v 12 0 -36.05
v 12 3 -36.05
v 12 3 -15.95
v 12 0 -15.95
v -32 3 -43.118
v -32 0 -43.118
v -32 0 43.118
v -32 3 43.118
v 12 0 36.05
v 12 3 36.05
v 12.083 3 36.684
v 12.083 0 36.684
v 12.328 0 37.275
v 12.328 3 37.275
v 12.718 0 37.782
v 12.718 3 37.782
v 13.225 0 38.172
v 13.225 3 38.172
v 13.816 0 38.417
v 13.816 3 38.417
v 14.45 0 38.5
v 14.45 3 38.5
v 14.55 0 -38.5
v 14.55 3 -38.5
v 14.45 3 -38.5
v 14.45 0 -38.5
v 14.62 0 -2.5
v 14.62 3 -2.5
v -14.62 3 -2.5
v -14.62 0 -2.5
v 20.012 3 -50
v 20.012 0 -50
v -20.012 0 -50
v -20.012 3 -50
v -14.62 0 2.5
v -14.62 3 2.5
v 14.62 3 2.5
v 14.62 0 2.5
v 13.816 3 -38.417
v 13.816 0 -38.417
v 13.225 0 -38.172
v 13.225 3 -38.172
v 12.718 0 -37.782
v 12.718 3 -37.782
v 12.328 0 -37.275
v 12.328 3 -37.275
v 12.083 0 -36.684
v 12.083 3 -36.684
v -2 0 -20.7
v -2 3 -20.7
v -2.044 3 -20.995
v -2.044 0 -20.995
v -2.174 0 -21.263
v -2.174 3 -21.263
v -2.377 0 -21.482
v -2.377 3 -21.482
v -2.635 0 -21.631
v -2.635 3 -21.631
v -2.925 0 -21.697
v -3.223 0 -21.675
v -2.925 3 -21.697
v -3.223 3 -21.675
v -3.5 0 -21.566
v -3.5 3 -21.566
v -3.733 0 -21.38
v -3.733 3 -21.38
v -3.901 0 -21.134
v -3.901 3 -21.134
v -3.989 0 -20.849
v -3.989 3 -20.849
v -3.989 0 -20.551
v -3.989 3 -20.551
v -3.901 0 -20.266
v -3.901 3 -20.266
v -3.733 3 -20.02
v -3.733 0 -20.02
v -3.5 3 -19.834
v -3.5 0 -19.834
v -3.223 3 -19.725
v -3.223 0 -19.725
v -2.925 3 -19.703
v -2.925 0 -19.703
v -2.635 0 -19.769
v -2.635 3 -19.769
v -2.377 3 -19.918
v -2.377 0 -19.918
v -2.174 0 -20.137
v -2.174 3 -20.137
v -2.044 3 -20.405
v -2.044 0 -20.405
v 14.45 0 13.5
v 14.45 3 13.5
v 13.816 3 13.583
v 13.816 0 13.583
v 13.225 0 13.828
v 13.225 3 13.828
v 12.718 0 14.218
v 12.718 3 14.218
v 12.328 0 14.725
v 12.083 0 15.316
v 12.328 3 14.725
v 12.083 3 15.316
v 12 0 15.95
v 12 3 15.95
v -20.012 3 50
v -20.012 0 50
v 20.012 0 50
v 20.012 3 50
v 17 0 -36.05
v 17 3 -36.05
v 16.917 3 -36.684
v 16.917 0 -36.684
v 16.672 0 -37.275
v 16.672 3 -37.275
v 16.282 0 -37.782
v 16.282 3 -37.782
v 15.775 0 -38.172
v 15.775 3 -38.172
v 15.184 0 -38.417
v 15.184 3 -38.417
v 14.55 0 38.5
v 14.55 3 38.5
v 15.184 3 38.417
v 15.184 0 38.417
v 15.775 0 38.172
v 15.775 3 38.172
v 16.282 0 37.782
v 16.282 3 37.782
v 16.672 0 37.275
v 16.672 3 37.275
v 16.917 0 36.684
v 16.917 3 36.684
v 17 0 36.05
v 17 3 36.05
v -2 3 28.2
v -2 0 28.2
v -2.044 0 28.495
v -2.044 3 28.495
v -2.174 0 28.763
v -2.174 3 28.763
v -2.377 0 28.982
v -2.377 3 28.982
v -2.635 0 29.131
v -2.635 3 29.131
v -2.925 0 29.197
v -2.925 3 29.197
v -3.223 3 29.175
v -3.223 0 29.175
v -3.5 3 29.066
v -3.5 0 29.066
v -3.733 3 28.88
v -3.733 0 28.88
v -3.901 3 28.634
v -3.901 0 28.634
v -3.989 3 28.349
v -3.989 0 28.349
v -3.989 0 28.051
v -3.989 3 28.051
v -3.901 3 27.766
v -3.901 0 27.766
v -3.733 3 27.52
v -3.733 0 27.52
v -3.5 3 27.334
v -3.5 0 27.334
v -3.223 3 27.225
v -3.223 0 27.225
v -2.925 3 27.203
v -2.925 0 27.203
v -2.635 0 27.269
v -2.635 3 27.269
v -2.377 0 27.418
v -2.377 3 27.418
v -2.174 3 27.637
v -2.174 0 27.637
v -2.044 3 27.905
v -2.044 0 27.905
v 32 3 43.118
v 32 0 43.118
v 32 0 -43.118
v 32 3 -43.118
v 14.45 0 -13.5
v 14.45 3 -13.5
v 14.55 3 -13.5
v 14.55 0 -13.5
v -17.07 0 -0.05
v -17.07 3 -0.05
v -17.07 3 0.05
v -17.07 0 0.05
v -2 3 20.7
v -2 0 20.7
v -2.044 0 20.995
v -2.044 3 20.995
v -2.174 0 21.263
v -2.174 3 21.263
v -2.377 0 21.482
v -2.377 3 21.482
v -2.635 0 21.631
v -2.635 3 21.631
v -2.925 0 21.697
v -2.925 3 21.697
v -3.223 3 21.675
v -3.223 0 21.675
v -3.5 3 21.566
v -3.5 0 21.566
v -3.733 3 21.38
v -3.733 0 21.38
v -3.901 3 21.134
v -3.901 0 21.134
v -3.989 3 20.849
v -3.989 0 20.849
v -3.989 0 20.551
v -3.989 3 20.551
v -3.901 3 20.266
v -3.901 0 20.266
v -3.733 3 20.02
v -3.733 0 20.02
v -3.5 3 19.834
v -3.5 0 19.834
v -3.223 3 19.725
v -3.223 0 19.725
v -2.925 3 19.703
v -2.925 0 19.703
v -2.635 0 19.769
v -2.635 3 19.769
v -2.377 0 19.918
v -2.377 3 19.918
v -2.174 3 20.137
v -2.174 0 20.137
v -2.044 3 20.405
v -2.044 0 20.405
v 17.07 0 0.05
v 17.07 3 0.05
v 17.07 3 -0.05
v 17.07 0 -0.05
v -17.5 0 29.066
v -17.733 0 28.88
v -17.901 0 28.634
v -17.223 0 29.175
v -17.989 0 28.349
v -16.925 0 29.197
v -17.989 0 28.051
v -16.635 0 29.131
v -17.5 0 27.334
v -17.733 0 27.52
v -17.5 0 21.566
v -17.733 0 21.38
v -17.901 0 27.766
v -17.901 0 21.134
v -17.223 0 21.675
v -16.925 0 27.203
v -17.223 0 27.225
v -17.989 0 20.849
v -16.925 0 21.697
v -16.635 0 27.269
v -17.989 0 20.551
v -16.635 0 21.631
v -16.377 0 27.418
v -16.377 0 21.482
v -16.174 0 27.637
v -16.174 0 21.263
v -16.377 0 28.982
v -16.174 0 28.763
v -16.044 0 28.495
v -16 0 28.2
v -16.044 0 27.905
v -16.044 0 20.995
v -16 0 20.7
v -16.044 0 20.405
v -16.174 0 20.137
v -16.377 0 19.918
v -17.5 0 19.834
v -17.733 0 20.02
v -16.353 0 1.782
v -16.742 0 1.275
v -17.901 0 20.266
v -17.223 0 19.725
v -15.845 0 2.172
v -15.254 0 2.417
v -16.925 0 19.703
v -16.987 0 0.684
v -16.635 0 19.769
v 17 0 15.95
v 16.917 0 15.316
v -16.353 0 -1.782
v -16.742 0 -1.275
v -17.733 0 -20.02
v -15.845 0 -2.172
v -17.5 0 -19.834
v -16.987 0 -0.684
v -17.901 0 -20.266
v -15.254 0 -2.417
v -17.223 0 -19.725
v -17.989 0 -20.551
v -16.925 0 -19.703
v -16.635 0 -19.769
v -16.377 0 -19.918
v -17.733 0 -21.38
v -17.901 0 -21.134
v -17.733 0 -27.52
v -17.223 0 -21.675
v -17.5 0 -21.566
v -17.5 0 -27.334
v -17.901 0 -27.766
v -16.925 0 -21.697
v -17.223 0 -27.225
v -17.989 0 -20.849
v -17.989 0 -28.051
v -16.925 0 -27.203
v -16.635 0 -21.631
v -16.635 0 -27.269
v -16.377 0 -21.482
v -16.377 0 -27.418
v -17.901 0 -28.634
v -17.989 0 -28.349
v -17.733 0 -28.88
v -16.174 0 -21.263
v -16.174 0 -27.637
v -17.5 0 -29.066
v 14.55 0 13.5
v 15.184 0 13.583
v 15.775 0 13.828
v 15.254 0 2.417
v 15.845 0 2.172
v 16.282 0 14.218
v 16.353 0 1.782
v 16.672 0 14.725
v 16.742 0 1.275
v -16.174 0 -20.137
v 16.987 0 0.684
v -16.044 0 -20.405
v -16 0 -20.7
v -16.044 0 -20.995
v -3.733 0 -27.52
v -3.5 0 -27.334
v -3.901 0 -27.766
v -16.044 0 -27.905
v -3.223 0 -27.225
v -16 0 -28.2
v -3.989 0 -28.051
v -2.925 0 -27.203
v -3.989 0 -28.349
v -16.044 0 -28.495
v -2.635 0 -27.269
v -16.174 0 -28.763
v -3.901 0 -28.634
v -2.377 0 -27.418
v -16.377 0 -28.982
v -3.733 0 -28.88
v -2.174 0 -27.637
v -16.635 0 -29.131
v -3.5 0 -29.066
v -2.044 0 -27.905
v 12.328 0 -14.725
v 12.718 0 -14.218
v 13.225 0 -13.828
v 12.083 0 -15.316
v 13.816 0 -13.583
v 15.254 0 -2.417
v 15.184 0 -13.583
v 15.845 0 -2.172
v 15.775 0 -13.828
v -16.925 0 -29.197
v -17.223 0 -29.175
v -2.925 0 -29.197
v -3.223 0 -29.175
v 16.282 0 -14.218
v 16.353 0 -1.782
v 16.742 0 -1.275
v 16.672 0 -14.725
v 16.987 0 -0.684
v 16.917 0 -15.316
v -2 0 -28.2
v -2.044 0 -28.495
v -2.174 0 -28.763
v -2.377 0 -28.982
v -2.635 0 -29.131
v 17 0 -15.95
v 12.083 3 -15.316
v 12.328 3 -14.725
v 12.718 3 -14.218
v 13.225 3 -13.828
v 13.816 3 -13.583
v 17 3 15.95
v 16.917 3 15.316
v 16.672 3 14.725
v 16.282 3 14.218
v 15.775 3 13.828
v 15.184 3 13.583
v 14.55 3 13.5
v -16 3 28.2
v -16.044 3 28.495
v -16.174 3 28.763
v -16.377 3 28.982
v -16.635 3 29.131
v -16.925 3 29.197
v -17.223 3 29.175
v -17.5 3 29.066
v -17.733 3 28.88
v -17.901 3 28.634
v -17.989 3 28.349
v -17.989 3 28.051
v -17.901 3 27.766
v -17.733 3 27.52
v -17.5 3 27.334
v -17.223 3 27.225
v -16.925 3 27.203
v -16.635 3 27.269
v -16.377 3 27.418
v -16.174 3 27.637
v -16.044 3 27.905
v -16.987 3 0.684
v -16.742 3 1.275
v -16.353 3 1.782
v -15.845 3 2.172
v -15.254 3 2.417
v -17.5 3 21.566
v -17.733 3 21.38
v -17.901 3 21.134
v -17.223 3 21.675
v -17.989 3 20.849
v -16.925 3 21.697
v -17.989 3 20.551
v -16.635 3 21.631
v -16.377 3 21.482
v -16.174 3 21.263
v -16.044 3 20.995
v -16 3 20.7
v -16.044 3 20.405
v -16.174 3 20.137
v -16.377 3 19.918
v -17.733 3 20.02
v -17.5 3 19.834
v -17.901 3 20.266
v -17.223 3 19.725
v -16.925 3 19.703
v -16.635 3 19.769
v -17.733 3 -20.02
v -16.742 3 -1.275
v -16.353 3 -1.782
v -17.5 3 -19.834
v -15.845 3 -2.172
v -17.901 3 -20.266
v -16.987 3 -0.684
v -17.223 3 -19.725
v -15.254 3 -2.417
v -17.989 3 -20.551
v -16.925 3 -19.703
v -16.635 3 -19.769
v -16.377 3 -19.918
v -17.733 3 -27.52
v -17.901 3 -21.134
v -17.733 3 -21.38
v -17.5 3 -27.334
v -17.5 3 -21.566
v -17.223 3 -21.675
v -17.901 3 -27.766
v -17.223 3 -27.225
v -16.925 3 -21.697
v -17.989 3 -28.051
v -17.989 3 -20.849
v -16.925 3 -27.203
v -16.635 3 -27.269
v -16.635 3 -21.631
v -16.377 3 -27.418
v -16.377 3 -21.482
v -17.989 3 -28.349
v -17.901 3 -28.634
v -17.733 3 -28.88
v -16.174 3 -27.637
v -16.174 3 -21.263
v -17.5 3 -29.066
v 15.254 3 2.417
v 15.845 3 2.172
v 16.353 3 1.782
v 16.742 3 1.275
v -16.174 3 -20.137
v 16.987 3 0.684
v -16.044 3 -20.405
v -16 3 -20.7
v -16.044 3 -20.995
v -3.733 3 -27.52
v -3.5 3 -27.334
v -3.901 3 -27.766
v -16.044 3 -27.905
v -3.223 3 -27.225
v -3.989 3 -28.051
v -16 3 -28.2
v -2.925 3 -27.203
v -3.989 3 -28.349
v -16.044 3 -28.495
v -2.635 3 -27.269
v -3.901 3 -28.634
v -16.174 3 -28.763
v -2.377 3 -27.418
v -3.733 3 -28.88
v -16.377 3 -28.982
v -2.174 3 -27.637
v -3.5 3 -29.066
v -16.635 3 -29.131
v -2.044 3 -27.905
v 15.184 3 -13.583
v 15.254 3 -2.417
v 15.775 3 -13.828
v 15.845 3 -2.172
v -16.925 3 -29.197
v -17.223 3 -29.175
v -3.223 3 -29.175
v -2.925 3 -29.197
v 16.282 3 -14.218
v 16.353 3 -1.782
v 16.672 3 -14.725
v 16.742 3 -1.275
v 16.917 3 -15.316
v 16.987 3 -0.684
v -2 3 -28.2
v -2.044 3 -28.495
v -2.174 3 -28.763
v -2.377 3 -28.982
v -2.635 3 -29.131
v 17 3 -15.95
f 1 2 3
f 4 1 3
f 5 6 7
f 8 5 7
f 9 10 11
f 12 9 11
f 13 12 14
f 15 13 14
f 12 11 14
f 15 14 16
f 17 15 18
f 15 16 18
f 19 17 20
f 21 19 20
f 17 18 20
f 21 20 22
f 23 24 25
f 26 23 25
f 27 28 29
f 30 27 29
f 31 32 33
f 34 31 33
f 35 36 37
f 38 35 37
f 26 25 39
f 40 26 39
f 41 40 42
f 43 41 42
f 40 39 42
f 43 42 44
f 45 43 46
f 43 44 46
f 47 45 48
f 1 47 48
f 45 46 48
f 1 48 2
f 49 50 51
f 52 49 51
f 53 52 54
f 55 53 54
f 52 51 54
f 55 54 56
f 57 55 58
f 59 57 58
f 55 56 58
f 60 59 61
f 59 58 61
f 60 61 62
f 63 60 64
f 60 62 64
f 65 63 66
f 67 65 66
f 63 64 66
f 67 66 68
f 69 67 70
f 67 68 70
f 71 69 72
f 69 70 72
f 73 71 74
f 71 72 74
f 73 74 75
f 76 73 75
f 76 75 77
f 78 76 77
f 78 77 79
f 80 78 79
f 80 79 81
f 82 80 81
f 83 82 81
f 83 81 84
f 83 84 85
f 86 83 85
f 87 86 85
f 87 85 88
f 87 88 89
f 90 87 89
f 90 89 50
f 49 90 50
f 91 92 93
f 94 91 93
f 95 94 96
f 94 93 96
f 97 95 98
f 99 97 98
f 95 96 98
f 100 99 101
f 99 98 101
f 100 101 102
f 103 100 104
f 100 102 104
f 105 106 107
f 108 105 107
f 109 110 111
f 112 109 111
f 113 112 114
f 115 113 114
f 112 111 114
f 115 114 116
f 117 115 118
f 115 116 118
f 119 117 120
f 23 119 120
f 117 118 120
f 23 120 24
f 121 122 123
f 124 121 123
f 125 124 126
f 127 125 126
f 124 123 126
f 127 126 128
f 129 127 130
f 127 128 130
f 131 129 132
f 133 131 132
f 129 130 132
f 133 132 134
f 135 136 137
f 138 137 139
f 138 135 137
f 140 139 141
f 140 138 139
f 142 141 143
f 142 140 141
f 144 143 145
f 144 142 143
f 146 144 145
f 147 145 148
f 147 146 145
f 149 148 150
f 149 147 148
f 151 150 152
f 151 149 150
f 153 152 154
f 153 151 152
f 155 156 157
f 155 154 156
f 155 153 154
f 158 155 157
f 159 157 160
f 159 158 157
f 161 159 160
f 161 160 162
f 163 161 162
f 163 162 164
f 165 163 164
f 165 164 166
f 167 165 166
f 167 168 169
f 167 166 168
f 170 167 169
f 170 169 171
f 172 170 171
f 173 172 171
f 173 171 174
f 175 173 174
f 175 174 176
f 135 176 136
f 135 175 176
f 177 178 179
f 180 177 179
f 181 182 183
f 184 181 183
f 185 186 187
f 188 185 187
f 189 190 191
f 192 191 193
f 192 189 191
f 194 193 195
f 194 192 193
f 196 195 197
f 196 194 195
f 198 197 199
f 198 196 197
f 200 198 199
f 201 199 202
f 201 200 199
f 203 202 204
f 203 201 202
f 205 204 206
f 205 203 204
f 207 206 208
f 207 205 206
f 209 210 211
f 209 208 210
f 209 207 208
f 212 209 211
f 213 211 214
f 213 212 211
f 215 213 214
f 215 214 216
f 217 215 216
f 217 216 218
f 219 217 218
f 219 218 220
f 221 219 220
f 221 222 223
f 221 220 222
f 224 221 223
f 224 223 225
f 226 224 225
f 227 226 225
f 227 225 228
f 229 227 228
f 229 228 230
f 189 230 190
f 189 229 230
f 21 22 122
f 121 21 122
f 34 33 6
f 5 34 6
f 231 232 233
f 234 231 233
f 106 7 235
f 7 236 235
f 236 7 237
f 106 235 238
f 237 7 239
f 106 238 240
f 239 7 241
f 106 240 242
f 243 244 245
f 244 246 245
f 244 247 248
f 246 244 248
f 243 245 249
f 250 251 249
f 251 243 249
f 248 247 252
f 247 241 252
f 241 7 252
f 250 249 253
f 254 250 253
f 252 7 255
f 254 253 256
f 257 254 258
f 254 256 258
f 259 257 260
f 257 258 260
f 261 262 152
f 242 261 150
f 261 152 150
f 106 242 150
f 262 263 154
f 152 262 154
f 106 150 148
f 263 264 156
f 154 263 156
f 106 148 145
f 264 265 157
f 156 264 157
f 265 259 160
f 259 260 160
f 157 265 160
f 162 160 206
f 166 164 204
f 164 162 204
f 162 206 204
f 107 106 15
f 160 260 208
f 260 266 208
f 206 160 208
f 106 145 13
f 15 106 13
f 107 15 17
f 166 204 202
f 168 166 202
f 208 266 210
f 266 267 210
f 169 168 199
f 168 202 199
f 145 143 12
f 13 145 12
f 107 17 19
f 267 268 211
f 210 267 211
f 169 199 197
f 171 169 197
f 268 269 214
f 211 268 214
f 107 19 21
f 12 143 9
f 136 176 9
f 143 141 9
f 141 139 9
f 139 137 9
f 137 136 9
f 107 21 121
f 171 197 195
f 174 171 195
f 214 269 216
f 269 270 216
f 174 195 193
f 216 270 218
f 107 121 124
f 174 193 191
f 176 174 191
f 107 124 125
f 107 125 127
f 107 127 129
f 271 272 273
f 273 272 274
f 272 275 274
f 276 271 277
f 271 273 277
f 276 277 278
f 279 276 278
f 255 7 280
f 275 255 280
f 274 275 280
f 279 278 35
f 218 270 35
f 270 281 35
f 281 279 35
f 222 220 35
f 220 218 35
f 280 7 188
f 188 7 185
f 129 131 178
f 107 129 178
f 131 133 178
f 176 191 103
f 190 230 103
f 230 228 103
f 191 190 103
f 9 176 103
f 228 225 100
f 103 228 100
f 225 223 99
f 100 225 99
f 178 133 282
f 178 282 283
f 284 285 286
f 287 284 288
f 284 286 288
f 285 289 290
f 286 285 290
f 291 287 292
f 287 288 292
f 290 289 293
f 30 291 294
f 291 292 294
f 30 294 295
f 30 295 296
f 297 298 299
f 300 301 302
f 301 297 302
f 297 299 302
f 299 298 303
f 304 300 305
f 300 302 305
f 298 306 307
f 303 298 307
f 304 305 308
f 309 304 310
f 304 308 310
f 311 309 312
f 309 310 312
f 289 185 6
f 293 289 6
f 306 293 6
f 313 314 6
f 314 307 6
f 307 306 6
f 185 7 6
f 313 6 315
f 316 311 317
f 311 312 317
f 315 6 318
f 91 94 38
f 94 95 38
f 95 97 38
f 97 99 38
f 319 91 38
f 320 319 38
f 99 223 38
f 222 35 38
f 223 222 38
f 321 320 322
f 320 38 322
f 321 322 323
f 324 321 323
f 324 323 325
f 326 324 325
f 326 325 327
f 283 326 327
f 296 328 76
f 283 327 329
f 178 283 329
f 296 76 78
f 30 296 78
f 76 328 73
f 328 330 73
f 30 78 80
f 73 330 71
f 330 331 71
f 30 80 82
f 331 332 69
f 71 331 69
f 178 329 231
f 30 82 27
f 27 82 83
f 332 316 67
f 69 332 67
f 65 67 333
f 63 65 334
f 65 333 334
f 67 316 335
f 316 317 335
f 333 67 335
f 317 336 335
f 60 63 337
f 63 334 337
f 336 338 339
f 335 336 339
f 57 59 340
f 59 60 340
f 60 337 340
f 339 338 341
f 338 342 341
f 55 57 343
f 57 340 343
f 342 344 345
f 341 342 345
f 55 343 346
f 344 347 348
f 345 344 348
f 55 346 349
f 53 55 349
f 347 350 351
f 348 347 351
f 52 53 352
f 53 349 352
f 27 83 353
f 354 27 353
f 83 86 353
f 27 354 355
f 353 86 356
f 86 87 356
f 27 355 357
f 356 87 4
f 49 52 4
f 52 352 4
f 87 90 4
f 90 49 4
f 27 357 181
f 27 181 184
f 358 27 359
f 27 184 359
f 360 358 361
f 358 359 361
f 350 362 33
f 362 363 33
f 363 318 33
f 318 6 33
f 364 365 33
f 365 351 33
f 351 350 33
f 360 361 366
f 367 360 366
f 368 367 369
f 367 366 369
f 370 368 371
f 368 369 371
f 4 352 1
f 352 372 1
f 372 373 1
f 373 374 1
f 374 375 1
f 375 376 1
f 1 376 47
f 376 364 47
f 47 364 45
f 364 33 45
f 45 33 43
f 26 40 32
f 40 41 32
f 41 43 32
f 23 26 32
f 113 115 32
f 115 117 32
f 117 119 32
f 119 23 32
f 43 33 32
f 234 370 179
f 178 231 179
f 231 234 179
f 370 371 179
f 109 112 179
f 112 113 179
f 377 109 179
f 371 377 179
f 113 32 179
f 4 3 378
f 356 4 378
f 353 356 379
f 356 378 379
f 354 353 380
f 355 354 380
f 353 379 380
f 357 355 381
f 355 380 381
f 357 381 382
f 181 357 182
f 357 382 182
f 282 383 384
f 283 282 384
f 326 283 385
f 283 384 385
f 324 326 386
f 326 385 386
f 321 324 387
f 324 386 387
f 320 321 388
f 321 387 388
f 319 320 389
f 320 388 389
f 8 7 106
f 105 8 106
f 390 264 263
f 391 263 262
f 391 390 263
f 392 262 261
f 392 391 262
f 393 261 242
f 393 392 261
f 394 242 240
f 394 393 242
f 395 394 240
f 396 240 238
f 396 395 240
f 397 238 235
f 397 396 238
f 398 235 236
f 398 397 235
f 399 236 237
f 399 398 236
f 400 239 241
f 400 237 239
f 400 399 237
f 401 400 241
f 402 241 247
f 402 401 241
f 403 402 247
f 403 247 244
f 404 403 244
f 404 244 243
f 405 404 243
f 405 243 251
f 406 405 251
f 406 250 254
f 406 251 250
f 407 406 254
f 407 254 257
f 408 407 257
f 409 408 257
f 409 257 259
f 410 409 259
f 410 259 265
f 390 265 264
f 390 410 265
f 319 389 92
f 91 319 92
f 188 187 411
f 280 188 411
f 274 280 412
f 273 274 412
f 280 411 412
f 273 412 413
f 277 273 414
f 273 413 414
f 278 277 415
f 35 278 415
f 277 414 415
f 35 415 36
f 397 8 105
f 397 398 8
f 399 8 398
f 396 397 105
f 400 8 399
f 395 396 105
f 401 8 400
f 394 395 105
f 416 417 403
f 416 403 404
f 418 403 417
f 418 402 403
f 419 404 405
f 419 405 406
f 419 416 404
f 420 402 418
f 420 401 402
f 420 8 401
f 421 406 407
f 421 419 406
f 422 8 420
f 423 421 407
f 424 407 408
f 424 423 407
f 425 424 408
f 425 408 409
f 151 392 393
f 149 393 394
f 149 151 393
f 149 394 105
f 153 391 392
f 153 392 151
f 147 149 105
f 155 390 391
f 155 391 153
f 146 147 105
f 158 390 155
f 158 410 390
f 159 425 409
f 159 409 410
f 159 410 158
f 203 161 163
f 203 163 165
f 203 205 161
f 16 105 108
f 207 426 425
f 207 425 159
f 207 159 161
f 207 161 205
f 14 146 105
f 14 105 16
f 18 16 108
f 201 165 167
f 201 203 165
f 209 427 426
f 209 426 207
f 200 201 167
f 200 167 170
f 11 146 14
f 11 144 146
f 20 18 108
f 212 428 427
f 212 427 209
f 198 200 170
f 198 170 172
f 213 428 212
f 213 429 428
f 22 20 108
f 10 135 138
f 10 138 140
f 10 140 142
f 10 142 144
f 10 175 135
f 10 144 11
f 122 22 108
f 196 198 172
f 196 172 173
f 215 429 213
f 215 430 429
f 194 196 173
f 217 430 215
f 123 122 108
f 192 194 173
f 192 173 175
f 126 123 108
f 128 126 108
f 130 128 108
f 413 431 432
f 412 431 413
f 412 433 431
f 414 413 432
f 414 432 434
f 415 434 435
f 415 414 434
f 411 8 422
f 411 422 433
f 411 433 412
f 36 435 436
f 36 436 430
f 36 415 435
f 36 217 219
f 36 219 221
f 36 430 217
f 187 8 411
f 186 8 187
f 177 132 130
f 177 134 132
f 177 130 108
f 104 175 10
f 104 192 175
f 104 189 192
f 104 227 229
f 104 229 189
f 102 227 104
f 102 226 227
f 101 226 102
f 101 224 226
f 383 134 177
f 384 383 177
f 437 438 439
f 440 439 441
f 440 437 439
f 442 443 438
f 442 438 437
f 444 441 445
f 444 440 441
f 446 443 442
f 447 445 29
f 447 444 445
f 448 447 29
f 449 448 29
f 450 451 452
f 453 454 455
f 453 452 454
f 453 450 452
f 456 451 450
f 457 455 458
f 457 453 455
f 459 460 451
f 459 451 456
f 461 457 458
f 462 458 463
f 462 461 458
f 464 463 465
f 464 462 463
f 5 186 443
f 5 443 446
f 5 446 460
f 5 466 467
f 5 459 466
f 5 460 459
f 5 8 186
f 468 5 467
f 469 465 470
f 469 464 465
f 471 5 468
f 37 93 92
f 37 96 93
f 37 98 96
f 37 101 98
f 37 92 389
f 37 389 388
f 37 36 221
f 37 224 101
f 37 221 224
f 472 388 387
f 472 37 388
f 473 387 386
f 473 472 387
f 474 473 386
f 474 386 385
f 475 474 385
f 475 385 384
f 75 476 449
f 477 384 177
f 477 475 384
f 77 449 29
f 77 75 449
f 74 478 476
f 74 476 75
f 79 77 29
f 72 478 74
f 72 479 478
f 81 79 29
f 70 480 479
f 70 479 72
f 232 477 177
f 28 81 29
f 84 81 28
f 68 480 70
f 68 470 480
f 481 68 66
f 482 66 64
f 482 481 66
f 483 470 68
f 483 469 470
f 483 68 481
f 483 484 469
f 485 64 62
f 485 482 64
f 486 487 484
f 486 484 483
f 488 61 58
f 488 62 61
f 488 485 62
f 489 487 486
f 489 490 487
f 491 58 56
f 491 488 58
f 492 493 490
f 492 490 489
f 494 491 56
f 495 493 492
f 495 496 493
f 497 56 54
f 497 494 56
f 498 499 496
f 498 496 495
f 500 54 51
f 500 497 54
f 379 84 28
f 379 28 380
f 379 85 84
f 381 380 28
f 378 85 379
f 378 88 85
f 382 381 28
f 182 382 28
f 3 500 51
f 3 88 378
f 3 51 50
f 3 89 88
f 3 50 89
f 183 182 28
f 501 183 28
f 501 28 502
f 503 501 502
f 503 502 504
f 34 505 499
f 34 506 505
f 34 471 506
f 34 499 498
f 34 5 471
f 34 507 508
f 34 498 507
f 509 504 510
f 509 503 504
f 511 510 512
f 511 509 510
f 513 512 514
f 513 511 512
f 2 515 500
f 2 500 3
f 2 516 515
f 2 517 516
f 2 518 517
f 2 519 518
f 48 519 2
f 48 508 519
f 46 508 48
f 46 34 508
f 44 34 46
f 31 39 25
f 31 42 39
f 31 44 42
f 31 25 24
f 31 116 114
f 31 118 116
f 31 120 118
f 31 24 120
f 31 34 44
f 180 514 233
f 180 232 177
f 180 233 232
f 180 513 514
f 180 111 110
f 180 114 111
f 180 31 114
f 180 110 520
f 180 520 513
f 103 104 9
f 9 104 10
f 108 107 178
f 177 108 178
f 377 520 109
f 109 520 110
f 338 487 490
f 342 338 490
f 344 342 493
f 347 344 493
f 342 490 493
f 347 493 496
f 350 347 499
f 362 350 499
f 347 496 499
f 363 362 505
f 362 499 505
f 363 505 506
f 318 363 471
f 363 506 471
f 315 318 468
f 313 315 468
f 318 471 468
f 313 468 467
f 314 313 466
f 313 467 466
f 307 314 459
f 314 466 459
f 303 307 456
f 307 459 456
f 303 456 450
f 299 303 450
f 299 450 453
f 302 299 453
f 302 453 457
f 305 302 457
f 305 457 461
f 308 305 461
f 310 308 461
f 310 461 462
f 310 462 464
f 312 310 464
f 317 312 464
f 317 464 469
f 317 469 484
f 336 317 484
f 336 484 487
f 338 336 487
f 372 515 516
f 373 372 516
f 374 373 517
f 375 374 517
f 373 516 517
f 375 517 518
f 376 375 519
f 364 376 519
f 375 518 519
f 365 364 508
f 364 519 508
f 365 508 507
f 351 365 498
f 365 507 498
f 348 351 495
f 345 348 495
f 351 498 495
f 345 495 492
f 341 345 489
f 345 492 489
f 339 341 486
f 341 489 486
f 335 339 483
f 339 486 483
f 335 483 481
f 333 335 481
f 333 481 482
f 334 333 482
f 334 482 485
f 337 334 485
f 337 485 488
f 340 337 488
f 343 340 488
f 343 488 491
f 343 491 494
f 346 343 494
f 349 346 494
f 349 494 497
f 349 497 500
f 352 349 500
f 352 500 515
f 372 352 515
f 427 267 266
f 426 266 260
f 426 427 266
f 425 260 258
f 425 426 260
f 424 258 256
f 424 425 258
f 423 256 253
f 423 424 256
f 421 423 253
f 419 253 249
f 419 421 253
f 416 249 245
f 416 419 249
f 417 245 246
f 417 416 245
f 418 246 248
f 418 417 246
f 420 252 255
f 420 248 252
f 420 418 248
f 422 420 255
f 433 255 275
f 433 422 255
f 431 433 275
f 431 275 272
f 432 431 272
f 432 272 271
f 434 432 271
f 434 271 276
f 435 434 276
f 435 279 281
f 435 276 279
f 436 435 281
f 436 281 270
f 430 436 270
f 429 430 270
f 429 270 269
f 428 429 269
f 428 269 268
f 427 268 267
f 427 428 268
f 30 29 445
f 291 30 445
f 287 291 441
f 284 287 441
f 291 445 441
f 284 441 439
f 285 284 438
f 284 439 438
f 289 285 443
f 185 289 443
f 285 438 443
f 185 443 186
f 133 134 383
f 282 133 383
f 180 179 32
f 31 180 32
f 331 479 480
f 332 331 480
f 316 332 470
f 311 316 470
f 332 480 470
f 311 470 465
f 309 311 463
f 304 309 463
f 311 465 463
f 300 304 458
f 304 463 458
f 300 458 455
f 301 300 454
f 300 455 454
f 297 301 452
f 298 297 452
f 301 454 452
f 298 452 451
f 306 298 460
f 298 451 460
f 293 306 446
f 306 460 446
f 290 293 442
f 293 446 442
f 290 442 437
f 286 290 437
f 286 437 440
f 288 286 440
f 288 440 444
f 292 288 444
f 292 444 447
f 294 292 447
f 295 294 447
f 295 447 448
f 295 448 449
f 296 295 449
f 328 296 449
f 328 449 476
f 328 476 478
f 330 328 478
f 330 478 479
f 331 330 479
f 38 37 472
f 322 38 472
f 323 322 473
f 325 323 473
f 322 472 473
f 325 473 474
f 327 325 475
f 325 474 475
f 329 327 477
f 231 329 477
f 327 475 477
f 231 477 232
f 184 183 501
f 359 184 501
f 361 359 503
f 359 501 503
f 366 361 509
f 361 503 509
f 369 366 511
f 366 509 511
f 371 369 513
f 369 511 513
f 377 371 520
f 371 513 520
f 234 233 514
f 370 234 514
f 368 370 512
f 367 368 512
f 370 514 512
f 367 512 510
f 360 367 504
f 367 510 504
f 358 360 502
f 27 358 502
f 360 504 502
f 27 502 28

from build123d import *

# Parameters (mm, degrees)
BOSS_EXTRUDE1_DEPTH = 3
CUT_EXTRUDE2_DEPTH  = 10
SKETCH7_R           = 1
CUT_EXTRUDE3_DEPTH  = 11.5


with BuildPart() as part:
    # Sketch1 → Boss-Extrude1 (new body)
    with BuildSketch(Plane(origin=(0, 0, 0), x_dir=(1, 0, 0), z_dir=(0, 1, 0))):
        Polygon((-32, -43.117707706), (-20.011895516, -50), (20.011895516, -50), (32, -43.117707706), (32, 43.117707706), (20.011895516, 50), (-20.011895516, 50), (-32, 43.117707706), align=None)
    extrude(amount=BOSS_EXTRUDE1_DEPTH)

    # Sketch5 → Cut-Extrude2 (cut)
    with BuildSketch(Plane(origin=(0, 3, 0), x_dir=(1, 0, 0), z_dir=(0, 1, 0))):
        with BuildLine():
            Line((-14.620176413, -2.5), (14.620176413, -2.5))
            ThreePointArc((14.620176413, -2.5), (16.352588027, -1.782411614), (17.070176413, -0.05))
            Line((17.070176413, -0.05), (17.070176413, 0.05))
            ThreePointArc((17.070176413, 0.05), (16.352588027, 1.782411614), (14.620176413, 2.5))
            Line((14.620176413, 2.5), (-14.620176413, 2.5))
            ThreePointArc((-14.620176413, 2.5), (-16.352588027, 1.782411614), (-17.070176413, 0.05))
            Line((-17.070176413, 0.05), (-17.070176413, -0.05))
            ThreePointArc((-17.070176413, -0.05), (-16.352588027, -1.782411614), (-14.620176413, -2.5))
        make_face()
        with BuildLine():
            Line((14.45, -38.5), (14.55, -38.5))
            ThreePointArc((14.55, -38.5), (16.282411614, -37.782411614), (17, -36.05))
            Line((17, -36.05), (17, -15.95))
            ThreePointArc((17, -15.95), (16.282411614, -14.217588386), (14.55, -13.5))
            Line((14.55, -13.5), (14.45, -13.5))
            ThreePointArc((14.45, -13.5), (12.717588386, -14.217588386), (12, -15.95))
            Line((12, -15.95), (12, -36.05))
            ThreePointArc((12, -36.05), (12.717588386, -37.782411614), (14.45, -38.5))
        make_face()
        with BuildLine():
            Line((14.45, 13.5), (14.55, 13.5))
            ThreePointArc((14.55, 13.5), (16.282411614, 14.217588386), (17, 15.95))
            Line((17, 15.95), (17, 36.05))
            ThreePointArc((17, 36.05), (16.282411614, 37.782411614), (14.55, 38.5))
            Line((14.55, 38.5), (14.45, 38.5))
            ThreePointArc((14.45, 38.5), (12.717588386, 37.782411614), (12, 36.05))
            Line((12, 36.05), (12, 15.95))
            ThreePointArc((12, 15.95), (12.717588386, 14.217588386), (14.45, 13.5))
        make_face()
    extrude(amount=-CUT_EXTRUDE2_DEPTH, mode=Mode.SUBTRACT)

    # Sketch7 → Cut-Extrude3 (cut)
    with BuildSketch(Plane(origin=(0, 3, 0), x_dir=(1, 0, 0), z_dir=(0, 1, 0))):
        with Locations((-3, 28.2)):
            Circle(SKETCH7_R)
        with Locations((-3, 20.7)):
            Circle(SKETCH7_R)
        with Locations((-17, 20.7)):
            Circle(SKETCH7_R)
        with Locations((-17, 28.2)):
            Circle(SKETCH7_R)
    cut_extrude3 = extrude(amount=-CUT_EXTRUDE3_DEPTH, mode=Mode.SUBTRACT)

    # Mirror1: Cut-Extrude3 across plane
    add(cut_extrude3.mirror(Plane(origin=(0, 0, 0), x_dir=(1, 0, 0), z_dir=(0, 0, -1))), mode=Mode.SUBTRACT)


solid = part.part
